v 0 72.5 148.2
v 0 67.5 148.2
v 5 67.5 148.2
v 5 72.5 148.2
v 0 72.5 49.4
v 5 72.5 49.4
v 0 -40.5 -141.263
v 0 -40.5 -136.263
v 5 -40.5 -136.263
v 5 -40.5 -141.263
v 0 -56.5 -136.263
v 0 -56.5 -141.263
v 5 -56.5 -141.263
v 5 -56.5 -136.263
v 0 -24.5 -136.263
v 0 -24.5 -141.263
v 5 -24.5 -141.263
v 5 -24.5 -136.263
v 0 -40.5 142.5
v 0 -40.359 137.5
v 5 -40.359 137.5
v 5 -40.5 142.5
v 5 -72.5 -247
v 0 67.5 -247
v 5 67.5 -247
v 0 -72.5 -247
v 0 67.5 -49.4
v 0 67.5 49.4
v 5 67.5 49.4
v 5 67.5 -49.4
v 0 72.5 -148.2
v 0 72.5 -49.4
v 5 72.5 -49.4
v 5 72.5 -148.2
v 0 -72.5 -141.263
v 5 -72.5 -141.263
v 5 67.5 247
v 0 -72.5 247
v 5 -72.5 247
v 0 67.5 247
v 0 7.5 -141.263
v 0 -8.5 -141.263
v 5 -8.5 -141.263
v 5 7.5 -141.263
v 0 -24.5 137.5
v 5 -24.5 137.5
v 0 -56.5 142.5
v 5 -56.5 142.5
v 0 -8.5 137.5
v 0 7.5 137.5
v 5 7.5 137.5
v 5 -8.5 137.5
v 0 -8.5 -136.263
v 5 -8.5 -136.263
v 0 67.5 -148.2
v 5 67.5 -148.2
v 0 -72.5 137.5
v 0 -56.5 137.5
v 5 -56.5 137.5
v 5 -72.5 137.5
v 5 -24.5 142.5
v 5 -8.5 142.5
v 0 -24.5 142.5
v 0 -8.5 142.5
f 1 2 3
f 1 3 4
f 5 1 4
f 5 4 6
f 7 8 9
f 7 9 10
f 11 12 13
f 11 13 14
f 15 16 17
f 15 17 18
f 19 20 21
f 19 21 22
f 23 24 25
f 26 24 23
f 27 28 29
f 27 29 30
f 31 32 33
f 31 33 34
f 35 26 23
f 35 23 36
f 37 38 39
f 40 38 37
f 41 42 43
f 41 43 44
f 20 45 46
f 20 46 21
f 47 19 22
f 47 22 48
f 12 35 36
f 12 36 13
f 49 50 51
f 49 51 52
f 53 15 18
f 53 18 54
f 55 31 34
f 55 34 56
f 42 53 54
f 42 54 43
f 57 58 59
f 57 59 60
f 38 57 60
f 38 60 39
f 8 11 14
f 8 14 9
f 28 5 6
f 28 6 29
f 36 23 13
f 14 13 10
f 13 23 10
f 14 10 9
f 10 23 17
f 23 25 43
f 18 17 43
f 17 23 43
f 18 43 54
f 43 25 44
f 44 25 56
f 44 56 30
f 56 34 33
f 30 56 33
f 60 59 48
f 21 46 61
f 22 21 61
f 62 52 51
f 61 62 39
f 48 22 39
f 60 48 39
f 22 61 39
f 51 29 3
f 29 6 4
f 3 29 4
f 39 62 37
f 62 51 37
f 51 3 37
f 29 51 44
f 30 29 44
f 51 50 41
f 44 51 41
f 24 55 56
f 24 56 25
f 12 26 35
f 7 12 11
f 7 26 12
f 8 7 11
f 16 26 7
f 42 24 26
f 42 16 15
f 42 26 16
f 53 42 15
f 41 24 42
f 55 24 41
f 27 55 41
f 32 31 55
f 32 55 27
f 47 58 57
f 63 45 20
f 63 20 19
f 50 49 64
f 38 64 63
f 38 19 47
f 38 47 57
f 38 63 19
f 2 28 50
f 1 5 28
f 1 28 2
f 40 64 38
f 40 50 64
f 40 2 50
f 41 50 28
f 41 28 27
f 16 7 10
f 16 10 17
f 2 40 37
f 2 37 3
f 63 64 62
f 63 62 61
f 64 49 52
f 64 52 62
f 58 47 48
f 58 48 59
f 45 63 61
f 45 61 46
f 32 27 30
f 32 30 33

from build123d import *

# Parameters (mm, degrees)
BOSS_EXTRUDE1_DEPTH = 5


with BuildPart() as part:
    # Sketch1 → Boss-Extrude1 (new body)
    with BuildSketch(Plane(origin=(0, 0, 0), x_dir=(0, 0, -1), z_dir=(1, 0, 0))):
        Polygon((-247, 67.5), (-148.2, 67.5), (-148.2, 72.5), (-49.4, 72.5), (-49.4, 67.5), (49.4, 67.5), (49.4, 72.5), (148.2, 72.5), (148.2, 67.5), (247, 67.5), (247, -72.5), (141.262721236, -72.5), (141.262721236, -56.5), (136.262721236, -56.5), (136.262721236, -40.5), (141.262721236, -40.5), (141.262721236, -24.5), (136.262721236, -24.5), (136.262721236, -8.5), (141.262721236, -8.5), (141.262721236, 7.5), (0, 7.5), (-137.5, 7.5), (-137.5, -8.5), (-142.5, -8.5), (-142.5, -24.5), (-137.5, -24.5), (-137.5, -40.359311741), (-142.5, -40.5), (-142.5, -56.5), (-137.5, -56.5), (-137.5, -72.5), (-247, -72.5), align=None)
    extrude(amount=BOSS_EXTRUDE1_DEPTH)


solid = part.part
